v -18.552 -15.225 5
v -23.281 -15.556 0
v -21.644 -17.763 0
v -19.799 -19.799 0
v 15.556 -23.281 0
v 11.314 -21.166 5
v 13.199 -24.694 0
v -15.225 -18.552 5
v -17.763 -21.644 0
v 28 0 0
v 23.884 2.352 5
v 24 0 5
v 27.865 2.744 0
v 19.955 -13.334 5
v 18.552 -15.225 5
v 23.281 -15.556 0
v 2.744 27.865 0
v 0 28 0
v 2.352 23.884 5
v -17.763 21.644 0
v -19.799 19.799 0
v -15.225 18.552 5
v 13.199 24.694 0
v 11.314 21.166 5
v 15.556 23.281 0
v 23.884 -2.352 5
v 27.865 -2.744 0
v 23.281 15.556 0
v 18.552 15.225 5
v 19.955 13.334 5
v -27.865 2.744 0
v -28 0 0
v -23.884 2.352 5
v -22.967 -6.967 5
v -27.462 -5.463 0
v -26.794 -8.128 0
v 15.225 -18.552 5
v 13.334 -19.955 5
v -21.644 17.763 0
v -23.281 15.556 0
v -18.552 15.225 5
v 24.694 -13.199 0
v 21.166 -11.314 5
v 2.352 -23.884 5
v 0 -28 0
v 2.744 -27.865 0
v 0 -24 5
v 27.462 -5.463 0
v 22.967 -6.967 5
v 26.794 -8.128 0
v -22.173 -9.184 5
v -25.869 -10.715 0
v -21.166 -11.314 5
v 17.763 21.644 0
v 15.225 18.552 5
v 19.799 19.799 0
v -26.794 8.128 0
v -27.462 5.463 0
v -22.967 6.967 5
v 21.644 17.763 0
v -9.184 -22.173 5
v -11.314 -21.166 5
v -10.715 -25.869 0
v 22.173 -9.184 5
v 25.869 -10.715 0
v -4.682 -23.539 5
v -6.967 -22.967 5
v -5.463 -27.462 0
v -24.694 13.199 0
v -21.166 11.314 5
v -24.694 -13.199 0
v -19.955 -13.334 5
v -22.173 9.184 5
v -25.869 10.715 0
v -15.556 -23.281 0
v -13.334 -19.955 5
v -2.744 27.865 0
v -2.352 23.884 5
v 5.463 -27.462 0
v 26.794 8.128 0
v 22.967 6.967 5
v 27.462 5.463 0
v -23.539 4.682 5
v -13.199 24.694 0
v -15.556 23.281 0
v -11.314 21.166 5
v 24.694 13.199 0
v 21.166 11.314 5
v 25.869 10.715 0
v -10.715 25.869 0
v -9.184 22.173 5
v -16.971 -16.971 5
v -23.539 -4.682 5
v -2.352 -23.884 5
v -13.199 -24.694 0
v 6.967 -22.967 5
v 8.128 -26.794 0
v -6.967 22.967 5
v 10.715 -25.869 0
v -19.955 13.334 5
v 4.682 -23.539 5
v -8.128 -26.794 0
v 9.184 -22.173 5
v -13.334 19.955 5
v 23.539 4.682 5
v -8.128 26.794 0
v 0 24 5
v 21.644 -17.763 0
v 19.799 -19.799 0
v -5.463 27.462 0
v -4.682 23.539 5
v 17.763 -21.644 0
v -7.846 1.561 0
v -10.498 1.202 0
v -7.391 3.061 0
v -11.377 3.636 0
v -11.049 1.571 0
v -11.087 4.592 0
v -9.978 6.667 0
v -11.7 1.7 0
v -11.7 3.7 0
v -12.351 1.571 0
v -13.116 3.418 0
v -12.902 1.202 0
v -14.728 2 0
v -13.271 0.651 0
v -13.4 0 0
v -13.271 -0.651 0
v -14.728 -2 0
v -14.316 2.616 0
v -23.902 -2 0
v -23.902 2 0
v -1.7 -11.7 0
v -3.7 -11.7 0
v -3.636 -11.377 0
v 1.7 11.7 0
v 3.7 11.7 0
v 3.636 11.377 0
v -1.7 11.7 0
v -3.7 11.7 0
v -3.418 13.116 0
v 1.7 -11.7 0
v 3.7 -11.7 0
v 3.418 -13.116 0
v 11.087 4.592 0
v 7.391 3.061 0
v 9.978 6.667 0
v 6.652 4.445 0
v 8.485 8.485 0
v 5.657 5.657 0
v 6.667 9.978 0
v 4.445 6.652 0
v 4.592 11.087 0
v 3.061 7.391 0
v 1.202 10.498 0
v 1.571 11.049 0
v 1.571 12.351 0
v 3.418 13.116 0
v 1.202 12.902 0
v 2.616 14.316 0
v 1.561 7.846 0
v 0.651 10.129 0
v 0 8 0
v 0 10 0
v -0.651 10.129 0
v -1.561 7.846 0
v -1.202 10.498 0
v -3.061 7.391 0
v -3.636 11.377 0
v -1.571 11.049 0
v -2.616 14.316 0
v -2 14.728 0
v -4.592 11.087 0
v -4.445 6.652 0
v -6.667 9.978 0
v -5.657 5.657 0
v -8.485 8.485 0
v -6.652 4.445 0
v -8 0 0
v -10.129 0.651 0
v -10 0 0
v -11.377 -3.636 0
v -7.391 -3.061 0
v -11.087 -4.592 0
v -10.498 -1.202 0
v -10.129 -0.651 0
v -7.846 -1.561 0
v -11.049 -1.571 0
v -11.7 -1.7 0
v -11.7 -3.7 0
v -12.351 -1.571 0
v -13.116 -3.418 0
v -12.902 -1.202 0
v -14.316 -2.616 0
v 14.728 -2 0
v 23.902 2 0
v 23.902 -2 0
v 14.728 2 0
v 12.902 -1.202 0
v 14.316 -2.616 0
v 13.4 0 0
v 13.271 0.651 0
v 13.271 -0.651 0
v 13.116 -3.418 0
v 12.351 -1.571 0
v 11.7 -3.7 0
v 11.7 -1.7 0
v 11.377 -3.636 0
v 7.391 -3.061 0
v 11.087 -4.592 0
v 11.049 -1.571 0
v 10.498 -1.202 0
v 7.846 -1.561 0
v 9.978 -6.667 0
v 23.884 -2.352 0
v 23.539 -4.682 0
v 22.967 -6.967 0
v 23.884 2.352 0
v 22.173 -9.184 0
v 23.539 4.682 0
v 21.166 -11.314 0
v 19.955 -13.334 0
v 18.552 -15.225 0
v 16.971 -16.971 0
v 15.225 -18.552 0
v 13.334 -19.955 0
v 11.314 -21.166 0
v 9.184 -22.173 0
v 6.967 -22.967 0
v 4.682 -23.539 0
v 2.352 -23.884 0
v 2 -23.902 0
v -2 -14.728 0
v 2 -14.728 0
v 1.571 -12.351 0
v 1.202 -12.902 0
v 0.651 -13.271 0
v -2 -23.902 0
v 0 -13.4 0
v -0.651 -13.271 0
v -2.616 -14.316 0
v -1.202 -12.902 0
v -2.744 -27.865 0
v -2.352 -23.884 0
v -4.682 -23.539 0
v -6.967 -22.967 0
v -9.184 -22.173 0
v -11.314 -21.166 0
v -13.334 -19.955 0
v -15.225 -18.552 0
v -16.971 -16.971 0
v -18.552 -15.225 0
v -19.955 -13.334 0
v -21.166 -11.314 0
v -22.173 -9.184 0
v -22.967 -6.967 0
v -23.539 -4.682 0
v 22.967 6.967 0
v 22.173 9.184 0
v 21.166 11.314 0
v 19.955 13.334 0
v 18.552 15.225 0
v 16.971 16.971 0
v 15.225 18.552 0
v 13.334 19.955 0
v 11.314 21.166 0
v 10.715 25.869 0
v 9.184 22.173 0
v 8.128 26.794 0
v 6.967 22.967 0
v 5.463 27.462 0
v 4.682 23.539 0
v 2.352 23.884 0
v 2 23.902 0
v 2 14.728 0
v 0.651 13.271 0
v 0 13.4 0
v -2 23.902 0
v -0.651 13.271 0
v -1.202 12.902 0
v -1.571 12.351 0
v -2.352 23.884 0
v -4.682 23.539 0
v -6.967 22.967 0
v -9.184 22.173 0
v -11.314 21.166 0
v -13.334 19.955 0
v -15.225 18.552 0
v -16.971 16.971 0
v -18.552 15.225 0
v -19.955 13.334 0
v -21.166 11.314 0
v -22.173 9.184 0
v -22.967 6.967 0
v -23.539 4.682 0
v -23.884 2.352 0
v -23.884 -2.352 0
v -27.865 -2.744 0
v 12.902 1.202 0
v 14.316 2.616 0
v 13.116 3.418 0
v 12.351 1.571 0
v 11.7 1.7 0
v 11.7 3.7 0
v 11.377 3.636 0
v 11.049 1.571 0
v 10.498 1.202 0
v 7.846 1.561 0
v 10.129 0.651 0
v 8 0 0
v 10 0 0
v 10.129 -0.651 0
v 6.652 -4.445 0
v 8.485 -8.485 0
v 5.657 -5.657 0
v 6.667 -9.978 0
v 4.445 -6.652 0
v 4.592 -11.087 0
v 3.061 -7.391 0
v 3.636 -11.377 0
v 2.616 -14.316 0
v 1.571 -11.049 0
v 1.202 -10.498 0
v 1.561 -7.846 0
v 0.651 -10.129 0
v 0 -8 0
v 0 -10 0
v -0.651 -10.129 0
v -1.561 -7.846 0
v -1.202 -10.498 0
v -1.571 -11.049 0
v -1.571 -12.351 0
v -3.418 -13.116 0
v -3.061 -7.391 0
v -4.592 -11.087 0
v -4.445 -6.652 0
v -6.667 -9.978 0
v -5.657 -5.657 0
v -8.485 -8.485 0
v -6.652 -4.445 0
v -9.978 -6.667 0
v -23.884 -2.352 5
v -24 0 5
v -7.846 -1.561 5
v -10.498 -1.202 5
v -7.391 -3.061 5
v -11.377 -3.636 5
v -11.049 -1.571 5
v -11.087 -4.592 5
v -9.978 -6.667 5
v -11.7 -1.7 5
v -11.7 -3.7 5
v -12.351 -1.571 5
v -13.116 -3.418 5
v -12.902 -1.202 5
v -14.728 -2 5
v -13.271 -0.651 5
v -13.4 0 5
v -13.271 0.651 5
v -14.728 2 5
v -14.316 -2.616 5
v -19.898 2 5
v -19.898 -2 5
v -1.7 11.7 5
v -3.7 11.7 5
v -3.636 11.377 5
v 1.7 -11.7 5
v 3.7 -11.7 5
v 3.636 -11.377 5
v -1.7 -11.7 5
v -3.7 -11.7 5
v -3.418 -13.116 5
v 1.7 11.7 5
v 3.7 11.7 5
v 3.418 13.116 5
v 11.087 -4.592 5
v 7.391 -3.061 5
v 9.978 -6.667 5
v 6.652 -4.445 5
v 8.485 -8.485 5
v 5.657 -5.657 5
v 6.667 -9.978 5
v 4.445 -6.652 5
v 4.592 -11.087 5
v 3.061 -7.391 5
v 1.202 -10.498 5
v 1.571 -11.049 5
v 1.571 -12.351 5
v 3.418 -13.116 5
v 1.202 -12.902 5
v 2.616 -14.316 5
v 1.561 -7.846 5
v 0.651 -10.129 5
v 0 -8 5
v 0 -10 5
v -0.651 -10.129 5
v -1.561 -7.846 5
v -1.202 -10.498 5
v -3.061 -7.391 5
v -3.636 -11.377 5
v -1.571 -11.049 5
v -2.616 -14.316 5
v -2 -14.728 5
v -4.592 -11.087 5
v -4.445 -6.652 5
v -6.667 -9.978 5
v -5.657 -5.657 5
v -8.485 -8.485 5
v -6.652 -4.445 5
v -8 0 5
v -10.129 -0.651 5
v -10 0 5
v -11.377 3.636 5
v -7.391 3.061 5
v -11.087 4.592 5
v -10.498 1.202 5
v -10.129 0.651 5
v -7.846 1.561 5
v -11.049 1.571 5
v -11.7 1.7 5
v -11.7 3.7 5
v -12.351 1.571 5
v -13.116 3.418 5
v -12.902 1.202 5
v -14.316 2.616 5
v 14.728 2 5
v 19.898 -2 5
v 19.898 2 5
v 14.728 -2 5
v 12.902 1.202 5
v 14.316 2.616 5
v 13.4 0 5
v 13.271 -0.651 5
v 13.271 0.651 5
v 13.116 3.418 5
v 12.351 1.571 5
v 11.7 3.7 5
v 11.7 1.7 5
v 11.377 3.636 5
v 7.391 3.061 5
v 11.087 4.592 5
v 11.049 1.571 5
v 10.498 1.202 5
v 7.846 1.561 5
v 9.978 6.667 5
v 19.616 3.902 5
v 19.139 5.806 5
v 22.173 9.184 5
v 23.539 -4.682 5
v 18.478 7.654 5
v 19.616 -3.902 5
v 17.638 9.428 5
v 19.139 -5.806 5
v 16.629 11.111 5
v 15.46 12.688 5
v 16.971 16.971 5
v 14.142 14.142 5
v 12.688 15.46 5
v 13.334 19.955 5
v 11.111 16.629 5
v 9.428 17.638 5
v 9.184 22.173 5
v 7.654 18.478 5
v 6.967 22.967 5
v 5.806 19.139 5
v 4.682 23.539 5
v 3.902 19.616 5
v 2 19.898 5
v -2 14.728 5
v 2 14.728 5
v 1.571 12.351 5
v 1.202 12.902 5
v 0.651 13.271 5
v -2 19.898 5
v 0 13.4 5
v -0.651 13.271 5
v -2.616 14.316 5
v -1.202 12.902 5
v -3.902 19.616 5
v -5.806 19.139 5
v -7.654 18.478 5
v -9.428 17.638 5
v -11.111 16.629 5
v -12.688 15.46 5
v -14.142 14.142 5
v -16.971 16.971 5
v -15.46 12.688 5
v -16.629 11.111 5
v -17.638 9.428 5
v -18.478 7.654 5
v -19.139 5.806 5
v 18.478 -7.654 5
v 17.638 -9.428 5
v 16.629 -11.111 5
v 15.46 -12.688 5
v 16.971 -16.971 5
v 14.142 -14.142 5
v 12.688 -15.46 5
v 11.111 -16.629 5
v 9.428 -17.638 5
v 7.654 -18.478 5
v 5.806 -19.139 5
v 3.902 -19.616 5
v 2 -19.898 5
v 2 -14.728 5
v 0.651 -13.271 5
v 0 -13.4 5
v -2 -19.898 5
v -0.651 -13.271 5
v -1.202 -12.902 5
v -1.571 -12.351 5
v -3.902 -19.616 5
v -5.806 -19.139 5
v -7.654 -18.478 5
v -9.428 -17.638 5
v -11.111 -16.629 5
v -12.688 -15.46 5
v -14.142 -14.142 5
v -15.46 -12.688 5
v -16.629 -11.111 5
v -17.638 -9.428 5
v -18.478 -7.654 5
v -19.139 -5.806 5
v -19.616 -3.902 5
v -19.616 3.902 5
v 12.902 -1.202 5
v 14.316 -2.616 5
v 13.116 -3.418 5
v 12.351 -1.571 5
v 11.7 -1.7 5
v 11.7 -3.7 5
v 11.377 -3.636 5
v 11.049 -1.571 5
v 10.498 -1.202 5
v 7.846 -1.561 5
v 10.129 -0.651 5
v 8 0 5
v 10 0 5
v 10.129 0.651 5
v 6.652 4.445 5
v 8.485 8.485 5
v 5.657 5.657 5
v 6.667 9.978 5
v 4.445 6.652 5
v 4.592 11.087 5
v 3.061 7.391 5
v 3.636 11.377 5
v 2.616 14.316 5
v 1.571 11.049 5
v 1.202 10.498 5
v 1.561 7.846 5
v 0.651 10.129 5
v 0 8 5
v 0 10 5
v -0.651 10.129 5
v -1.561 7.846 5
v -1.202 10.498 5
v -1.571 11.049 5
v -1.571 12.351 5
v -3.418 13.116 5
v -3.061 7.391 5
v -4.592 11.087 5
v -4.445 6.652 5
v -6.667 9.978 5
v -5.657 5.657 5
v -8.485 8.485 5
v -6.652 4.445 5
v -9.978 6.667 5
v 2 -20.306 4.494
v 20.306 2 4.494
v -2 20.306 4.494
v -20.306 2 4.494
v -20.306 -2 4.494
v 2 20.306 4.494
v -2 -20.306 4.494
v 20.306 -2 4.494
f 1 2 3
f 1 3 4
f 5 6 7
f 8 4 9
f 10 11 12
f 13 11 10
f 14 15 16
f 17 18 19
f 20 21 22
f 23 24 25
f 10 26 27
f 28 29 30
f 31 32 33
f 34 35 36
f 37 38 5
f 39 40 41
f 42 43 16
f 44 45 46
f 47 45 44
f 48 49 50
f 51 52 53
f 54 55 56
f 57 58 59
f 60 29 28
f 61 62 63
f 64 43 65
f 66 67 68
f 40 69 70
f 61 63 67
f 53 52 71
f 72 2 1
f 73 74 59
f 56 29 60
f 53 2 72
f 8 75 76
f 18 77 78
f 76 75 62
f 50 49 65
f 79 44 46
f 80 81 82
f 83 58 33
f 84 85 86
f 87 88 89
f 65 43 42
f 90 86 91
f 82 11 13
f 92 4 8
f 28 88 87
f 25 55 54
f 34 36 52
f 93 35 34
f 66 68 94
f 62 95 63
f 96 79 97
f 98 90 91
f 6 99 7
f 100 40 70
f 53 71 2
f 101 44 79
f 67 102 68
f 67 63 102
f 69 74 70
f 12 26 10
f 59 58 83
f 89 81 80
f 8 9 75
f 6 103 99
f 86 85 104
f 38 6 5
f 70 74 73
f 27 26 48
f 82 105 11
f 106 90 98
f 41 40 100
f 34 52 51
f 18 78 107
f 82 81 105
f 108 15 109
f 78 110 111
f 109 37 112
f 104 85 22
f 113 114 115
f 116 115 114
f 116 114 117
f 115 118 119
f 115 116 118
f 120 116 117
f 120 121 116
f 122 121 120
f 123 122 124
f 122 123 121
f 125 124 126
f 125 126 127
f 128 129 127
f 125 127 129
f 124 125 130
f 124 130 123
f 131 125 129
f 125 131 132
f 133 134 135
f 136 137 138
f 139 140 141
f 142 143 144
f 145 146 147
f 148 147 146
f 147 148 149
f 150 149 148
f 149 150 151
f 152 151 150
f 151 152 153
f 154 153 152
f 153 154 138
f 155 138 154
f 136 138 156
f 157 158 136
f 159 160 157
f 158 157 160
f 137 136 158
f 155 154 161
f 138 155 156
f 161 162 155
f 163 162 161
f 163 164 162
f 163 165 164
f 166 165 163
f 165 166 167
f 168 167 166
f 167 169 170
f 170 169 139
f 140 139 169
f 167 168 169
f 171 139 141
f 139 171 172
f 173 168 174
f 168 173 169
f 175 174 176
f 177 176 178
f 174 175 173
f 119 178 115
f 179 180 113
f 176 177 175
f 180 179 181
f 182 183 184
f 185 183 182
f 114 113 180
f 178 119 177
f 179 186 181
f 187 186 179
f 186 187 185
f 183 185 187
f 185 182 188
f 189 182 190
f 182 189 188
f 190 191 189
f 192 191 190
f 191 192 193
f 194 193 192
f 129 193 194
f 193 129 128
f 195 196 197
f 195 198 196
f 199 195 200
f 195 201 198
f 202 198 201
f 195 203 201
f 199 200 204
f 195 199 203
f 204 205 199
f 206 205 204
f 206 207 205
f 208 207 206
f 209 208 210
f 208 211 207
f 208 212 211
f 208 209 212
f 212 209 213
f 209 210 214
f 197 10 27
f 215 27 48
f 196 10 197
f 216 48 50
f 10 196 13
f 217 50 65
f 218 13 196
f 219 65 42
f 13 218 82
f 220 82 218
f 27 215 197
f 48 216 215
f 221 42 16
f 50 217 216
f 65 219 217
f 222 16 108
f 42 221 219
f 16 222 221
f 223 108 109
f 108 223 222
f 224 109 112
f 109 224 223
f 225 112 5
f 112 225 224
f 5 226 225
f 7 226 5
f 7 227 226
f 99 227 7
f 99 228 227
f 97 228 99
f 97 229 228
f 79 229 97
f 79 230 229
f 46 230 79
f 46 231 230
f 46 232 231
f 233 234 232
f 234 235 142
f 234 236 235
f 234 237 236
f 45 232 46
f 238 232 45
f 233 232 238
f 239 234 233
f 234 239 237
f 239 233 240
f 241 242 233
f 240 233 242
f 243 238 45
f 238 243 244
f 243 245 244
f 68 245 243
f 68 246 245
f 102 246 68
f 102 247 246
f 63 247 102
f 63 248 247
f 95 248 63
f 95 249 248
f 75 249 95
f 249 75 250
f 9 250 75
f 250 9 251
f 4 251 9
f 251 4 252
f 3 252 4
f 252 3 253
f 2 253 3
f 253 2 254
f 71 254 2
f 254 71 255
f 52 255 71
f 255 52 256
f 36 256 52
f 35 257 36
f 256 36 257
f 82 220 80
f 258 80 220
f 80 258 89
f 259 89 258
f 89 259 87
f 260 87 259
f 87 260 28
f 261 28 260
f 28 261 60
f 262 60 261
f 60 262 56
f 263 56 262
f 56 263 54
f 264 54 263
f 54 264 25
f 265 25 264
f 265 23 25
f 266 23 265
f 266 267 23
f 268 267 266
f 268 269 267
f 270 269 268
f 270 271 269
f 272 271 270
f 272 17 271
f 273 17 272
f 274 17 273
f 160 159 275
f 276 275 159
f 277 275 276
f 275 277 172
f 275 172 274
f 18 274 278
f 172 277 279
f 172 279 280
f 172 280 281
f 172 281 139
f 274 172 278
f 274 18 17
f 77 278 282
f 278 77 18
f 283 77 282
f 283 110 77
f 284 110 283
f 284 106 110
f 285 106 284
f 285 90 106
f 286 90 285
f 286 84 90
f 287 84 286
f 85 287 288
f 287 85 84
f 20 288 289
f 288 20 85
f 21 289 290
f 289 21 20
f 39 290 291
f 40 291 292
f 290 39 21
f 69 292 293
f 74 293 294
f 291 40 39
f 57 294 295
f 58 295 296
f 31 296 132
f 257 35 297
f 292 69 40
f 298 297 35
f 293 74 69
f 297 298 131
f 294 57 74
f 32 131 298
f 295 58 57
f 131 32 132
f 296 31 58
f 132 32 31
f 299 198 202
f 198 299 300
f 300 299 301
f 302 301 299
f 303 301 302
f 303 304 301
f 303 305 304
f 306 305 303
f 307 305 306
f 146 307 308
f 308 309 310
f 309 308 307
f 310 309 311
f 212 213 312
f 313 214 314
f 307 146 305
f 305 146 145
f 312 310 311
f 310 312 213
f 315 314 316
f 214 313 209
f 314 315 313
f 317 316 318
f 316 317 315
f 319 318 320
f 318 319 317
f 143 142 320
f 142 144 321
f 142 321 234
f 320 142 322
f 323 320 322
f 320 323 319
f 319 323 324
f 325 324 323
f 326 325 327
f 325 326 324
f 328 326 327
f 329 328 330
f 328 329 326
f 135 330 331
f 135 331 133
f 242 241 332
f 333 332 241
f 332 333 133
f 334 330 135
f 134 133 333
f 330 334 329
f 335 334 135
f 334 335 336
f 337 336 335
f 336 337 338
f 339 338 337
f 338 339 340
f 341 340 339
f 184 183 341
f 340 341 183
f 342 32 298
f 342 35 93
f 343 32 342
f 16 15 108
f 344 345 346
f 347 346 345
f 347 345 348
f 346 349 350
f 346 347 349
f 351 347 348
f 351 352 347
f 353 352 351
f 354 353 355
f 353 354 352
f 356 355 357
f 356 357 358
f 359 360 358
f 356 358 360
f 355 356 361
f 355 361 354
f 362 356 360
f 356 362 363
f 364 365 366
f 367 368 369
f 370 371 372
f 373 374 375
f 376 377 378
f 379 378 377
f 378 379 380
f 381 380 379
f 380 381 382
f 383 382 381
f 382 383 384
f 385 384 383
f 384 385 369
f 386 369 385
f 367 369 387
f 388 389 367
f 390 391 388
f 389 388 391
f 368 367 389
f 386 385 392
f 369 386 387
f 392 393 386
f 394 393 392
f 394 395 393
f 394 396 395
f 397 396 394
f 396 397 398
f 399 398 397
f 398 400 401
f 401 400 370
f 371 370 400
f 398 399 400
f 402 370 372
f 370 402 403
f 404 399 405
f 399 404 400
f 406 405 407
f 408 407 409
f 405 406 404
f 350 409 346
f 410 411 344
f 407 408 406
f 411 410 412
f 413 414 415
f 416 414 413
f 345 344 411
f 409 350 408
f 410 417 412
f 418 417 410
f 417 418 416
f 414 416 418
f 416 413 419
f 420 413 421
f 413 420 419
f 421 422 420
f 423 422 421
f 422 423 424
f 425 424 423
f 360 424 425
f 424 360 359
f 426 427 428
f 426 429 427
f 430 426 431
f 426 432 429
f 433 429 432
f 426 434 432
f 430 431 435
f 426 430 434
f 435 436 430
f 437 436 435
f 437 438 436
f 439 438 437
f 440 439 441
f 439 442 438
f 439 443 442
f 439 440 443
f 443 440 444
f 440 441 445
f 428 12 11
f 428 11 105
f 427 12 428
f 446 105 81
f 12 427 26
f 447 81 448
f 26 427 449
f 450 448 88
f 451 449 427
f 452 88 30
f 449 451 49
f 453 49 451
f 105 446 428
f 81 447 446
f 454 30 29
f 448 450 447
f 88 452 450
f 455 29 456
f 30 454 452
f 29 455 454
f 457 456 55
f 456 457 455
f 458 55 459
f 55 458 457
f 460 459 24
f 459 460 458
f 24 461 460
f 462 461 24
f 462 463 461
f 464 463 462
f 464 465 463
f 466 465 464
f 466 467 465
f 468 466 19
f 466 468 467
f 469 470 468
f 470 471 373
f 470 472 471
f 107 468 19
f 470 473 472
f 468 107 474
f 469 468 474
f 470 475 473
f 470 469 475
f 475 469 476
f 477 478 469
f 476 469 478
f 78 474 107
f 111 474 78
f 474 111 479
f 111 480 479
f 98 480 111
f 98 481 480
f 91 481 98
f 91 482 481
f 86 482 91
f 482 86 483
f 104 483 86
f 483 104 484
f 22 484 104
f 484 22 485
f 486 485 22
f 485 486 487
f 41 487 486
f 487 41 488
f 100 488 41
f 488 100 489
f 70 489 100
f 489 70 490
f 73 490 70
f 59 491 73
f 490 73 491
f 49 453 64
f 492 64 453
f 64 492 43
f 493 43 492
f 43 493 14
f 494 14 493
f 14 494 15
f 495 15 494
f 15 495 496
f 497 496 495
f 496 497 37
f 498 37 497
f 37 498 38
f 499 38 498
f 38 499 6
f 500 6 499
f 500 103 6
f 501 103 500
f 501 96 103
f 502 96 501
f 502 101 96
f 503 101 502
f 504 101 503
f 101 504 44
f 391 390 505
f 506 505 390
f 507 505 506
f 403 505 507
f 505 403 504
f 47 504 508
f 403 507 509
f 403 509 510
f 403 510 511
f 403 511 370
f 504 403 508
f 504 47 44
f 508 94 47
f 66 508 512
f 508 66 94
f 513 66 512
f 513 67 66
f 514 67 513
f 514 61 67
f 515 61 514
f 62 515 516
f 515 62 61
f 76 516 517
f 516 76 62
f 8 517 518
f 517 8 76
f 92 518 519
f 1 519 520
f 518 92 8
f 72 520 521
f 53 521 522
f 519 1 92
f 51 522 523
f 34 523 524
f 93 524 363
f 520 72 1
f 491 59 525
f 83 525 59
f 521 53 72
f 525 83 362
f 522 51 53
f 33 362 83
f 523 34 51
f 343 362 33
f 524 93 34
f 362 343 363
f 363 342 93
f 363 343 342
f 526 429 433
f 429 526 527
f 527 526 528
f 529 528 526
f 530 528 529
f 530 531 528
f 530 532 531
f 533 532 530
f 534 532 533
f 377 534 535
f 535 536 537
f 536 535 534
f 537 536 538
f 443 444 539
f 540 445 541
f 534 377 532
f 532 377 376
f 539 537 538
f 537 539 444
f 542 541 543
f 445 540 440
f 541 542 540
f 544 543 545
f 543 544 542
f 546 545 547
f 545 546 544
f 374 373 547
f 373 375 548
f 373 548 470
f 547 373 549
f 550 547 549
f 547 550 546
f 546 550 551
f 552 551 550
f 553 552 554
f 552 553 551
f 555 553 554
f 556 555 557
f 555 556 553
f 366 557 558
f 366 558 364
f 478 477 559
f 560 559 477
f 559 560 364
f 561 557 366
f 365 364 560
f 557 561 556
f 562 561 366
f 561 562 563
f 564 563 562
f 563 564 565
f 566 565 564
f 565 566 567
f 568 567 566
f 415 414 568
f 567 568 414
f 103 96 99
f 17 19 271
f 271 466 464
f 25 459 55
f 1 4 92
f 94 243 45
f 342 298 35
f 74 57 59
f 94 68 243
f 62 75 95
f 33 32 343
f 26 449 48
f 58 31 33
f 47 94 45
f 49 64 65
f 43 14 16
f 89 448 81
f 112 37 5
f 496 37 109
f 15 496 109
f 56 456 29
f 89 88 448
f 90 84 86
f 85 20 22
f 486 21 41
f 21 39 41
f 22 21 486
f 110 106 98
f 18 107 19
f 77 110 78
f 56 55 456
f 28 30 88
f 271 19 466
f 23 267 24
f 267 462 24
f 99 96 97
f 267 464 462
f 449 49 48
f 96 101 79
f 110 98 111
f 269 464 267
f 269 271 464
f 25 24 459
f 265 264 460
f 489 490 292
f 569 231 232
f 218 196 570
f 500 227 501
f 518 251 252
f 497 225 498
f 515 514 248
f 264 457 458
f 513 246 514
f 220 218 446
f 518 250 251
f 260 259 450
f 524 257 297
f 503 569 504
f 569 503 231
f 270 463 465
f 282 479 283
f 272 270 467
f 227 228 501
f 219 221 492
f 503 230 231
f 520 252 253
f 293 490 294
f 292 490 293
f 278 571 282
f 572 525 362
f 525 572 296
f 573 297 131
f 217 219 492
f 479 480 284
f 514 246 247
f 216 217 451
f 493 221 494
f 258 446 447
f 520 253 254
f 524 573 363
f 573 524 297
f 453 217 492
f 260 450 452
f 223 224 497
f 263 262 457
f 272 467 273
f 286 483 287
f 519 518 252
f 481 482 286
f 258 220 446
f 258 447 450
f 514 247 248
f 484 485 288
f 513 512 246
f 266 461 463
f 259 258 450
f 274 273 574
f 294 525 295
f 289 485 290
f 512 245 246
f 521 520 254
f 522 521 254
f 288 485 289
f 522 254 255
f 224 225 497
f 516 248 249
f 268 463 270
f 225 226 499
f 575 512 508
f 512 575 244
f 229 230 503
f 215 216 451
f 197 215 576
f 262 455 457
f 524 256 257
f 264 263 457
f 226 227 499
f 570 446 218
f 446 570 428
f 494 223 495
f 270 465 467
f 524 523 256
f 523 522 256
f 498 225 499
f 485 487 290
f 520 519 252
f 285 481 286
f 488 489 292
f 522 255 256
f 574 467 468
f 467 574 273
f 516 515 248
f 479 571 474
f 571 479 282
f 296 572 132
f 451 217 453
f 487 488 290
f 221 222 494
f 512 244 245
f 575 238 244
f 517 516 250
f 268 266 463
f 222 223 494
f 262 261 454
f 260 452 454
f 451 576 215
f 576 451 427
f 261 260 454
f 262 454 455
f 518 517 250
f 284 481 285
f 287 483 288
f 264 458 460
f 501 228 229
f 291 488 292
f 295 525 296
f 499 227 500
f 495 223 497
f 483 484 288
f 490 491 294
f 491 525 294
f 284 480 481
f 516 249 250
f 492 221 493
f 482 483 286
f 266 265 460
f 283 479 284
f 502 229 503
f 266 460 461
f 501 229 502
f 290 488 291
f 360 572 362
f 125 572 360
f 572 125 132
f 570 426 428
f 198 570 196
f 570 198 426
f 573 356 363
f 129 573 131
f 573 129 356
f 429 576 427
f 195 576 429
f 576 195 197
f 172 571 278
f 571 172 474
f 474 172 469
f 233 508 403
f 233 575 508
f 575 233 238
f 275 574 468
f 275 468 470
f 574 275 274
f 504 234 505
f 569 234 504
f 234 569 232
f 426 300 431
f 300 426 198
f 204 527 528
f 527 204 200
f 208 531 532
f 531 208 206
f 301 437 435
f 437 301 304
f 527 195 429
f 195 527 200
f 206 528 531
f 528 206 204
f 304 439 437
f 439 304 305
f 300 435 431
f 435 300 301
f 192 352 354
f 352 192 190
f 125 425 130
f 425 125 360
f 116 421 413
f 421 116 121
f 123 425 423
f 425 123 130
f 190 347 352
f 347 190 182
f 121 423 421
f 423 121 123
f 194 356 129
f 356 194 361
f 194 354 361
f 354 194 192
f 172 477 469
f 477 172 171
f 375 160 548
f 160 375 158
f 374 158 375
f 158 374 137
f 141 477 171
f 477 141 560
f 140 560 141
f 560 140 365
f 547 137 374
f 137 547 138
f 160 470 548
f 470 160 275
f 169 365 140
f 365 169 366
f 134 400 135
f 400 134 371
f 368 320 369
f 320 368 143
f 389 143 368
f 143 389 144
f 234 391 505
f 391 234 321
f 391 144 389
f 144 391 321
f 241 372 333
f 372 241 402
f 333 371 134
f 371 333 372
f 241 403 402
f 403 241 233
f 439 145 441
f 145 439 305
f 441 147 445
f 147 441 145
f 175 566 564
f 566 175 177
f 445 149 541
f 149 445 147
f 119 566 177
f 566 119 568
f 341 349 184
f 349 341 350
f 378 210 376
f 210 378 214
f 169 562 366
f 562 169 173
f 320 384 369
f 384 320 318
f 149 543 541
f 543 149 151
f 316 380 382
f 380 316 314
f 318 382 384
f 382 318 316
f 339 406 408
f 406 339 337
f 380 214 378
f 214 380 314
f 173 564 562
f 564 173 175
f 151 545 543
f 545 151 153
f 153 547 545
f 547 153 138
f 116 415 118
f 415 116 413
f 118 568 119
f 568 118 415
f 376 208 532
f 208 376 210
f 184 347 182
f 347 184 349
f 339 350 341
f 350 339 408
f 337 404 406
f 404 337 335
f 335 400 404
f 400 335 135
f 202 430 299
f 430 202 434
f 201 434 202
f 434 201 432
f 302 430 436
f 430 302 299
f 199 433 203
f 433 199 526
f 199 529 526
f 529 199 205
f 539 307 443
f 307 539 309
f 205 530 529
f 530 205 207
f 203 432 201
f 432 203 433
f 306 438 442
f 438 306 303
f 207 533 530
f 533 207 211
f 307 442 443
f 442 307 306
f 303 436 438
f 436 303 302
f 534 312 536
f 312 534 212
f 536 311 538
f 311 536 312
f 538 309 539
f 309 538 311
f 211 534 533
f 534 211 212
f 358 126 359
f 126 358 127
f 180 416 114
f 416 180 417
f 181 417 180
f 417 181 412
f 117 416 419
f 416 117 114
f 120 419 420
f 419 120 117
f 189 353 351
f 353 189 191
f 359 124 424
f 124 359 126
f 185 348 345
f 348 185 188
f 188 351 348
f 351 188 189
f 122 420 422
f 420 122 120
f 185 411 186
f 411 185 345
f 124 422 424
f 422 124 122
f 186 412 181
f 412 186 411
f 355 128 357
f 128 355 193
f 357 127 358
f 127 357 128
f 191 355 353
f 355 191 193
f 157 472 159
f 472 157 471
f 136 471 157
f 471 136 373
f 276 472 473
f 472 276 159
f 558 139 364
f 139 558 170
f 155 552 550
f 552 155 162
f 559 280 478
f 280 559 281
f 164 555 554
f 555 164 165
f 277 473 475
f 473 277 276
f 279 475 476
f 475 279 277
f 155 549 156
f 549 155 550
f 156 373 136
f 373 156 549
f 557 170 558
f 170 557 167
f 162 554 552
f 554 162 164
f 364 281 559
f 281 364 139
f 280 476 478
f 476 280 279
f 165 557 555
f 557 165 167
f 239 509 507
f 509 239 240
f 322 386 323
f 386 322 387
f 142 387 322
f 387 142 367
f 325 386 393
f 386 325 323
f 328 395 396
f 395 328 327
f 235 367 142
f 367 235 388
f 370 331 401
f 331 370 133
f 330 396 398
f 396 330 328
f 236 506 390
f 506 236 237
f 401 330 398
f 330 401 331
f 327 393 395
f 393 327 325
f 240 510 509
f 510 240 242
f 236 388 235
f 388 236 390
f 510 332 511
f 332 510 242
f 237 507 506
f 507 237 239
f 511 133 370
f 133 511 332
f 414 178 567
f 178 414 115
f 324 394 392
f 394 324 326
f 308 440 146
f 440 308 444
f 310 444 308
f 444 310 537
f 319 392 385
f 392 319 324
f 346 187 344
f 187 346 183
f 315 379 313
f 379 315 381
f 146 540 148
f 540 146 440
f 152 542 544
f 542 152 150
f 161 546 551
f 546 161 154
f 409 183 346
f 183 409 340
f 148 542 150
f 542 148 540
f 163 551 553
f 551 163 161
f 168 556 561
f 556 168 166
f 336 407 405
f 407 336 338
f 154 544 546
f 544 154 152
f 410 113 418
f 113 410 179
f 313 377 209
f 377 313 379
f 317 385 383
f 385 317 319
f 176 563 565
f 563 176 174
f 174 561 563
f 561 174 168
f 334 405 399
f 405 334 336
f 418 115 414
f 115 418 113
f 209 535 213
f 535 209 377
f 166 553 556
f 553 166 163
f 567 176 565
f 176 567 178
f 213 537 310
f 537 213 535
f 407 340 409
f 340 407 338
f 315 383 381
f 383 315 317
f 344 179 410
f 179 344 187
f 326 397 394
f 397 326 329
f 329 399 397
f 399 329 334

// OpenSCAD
// file: SpoolholderVars.scad
screwM3Diameter=3+0.4;
screwM3HolderDiameter=screwM3Diameter+2*2;
screwM3HolderRadius=screwM3HolderDiameter/2;
nutM3Height=2;
screw16M3Height=16;
screw30M3Height=30;

rodM8Diameter=8+0.6;
nutM8Diameter=14.4+1.2;
nutM8Height=6.4+1.0;

nutM8HolderDiameter=nutM8Diameter+2*3;
nutM8HolderRadius=nutM8HolderDiameter/2;


length=120;
bottomHeight=10;
topHeight=8;
topWidth=16;
connectorThickness=4;
bottomNutM8HoleHeight=nutM8Height+1.0;


bearingDiameter=28+0.8;
bearingHolderWallThickness=3;
bearingHolderDiameter=bearingDiameter+2*bearingHolderWallThickness;
bearingHolderRadius=bearingHolderDiameter/2;

bearingHolderLength=bearingHolderDiameter+2*screwM3HolderDiameter;
bearingHolderHoleDiameter=18;
bearingHolderBottomHeight=4;
bearingHolderScrewOffset=(bearingHolderLength-screwM3HolderDiameter)/2;
bearingHolderScrewHolderHeight=screw16M3Height-nutM3Height-topHeight;


coneHeight=5;
coneBigDiameter=56;
coneBigRadius=coneBigDiameter/2;
coneSmallDiameter=48;
coneSmallRadius=coneSmallDiameter/2;

coneNutHolderHoleDiameter=16;
coneNutHolderHoleRadius=coneNutHolderHoleDiameter/2;
coneNutHolderWallThickness=4;
coneNutHolderWithWallDiameter=coneNutHolderHoleDiameter+2*coneNutHolderWallThickness;
coneNutHolderScrewOffset=coneNutHolderHoleRadius+screwM3HolderRadius;
coneNutHolderBottomHeight=3;
coneNutHolderTotalHeight=screw30M3Height-nutM3Height-coneHeight;
coneNutHolderNutM8HoleHeight=nutM8Height-1.0;
// main file
include <SpoolholderVars.scad>

difference()
{
	union()
	{
		difference()
		{
			cylinder(d1=coneBigDiameter,d2=coneSmallDiameter,h=coneHeight,$fn=64);
			cylinder(d1=coneBigDiameter-2*coneNutHolderWallThickness,d2=coneSmallDiameter-2*coneNutHolderWallThickness,h=coneHeight,$fn=64);
		}
		
		// Conectors
		intersection()
		{
			cylinder(d1=coneBigDiameter,d2=coneSmallDiameter,h=coneHeight,$fn=64);
			union()
			{
				translate([-coneBigDiameter/2,-coneNutHolderWallThickness/2,0])
				cube([coneBigDiameter,coneNutHolderWallThickness,coneHeight]);
				
				rotate([0,0,90])
				translate([-coneBigDiameter/2,-coneNutHolderWallThickness/2,0])
				cube([coneBigDiameter,coneNutHolderWallThickness,coneHeight]);
			}
		}
		
		// Nut holder
		cylinder(d=coneNutHolderWithWallDiameter,h=coneHeight,$fn=32);
		
		// Screw holders
		for (t=[[1,0],[-1,0],[0,1],[0,-1]])
		translate([t[0]*coneNutHolderScrewOffset,t[1]*coneNutHolderScrewOffset,0])
		cylinder(d=screwM3HolderDiameter,h=coneHeight,$fn=16);
	}
	
	// Hole in the middle
	translate([0,0,-1])
	cylinder(d=coneNutHolderHoleDiameter,h=coneHeight+2,$fn=32);
	
	// Screw holes
	for (t=[[1,0],[-1,0],[0,1],[0,-1]])
	translate([t[0]*coneNutHolderScrewOffset,t[1]*coneNutHolderScrewOffset,-1])
	cylinder(d=screwM3Diameter,h=coneHeight+2,$fn=16);
}
